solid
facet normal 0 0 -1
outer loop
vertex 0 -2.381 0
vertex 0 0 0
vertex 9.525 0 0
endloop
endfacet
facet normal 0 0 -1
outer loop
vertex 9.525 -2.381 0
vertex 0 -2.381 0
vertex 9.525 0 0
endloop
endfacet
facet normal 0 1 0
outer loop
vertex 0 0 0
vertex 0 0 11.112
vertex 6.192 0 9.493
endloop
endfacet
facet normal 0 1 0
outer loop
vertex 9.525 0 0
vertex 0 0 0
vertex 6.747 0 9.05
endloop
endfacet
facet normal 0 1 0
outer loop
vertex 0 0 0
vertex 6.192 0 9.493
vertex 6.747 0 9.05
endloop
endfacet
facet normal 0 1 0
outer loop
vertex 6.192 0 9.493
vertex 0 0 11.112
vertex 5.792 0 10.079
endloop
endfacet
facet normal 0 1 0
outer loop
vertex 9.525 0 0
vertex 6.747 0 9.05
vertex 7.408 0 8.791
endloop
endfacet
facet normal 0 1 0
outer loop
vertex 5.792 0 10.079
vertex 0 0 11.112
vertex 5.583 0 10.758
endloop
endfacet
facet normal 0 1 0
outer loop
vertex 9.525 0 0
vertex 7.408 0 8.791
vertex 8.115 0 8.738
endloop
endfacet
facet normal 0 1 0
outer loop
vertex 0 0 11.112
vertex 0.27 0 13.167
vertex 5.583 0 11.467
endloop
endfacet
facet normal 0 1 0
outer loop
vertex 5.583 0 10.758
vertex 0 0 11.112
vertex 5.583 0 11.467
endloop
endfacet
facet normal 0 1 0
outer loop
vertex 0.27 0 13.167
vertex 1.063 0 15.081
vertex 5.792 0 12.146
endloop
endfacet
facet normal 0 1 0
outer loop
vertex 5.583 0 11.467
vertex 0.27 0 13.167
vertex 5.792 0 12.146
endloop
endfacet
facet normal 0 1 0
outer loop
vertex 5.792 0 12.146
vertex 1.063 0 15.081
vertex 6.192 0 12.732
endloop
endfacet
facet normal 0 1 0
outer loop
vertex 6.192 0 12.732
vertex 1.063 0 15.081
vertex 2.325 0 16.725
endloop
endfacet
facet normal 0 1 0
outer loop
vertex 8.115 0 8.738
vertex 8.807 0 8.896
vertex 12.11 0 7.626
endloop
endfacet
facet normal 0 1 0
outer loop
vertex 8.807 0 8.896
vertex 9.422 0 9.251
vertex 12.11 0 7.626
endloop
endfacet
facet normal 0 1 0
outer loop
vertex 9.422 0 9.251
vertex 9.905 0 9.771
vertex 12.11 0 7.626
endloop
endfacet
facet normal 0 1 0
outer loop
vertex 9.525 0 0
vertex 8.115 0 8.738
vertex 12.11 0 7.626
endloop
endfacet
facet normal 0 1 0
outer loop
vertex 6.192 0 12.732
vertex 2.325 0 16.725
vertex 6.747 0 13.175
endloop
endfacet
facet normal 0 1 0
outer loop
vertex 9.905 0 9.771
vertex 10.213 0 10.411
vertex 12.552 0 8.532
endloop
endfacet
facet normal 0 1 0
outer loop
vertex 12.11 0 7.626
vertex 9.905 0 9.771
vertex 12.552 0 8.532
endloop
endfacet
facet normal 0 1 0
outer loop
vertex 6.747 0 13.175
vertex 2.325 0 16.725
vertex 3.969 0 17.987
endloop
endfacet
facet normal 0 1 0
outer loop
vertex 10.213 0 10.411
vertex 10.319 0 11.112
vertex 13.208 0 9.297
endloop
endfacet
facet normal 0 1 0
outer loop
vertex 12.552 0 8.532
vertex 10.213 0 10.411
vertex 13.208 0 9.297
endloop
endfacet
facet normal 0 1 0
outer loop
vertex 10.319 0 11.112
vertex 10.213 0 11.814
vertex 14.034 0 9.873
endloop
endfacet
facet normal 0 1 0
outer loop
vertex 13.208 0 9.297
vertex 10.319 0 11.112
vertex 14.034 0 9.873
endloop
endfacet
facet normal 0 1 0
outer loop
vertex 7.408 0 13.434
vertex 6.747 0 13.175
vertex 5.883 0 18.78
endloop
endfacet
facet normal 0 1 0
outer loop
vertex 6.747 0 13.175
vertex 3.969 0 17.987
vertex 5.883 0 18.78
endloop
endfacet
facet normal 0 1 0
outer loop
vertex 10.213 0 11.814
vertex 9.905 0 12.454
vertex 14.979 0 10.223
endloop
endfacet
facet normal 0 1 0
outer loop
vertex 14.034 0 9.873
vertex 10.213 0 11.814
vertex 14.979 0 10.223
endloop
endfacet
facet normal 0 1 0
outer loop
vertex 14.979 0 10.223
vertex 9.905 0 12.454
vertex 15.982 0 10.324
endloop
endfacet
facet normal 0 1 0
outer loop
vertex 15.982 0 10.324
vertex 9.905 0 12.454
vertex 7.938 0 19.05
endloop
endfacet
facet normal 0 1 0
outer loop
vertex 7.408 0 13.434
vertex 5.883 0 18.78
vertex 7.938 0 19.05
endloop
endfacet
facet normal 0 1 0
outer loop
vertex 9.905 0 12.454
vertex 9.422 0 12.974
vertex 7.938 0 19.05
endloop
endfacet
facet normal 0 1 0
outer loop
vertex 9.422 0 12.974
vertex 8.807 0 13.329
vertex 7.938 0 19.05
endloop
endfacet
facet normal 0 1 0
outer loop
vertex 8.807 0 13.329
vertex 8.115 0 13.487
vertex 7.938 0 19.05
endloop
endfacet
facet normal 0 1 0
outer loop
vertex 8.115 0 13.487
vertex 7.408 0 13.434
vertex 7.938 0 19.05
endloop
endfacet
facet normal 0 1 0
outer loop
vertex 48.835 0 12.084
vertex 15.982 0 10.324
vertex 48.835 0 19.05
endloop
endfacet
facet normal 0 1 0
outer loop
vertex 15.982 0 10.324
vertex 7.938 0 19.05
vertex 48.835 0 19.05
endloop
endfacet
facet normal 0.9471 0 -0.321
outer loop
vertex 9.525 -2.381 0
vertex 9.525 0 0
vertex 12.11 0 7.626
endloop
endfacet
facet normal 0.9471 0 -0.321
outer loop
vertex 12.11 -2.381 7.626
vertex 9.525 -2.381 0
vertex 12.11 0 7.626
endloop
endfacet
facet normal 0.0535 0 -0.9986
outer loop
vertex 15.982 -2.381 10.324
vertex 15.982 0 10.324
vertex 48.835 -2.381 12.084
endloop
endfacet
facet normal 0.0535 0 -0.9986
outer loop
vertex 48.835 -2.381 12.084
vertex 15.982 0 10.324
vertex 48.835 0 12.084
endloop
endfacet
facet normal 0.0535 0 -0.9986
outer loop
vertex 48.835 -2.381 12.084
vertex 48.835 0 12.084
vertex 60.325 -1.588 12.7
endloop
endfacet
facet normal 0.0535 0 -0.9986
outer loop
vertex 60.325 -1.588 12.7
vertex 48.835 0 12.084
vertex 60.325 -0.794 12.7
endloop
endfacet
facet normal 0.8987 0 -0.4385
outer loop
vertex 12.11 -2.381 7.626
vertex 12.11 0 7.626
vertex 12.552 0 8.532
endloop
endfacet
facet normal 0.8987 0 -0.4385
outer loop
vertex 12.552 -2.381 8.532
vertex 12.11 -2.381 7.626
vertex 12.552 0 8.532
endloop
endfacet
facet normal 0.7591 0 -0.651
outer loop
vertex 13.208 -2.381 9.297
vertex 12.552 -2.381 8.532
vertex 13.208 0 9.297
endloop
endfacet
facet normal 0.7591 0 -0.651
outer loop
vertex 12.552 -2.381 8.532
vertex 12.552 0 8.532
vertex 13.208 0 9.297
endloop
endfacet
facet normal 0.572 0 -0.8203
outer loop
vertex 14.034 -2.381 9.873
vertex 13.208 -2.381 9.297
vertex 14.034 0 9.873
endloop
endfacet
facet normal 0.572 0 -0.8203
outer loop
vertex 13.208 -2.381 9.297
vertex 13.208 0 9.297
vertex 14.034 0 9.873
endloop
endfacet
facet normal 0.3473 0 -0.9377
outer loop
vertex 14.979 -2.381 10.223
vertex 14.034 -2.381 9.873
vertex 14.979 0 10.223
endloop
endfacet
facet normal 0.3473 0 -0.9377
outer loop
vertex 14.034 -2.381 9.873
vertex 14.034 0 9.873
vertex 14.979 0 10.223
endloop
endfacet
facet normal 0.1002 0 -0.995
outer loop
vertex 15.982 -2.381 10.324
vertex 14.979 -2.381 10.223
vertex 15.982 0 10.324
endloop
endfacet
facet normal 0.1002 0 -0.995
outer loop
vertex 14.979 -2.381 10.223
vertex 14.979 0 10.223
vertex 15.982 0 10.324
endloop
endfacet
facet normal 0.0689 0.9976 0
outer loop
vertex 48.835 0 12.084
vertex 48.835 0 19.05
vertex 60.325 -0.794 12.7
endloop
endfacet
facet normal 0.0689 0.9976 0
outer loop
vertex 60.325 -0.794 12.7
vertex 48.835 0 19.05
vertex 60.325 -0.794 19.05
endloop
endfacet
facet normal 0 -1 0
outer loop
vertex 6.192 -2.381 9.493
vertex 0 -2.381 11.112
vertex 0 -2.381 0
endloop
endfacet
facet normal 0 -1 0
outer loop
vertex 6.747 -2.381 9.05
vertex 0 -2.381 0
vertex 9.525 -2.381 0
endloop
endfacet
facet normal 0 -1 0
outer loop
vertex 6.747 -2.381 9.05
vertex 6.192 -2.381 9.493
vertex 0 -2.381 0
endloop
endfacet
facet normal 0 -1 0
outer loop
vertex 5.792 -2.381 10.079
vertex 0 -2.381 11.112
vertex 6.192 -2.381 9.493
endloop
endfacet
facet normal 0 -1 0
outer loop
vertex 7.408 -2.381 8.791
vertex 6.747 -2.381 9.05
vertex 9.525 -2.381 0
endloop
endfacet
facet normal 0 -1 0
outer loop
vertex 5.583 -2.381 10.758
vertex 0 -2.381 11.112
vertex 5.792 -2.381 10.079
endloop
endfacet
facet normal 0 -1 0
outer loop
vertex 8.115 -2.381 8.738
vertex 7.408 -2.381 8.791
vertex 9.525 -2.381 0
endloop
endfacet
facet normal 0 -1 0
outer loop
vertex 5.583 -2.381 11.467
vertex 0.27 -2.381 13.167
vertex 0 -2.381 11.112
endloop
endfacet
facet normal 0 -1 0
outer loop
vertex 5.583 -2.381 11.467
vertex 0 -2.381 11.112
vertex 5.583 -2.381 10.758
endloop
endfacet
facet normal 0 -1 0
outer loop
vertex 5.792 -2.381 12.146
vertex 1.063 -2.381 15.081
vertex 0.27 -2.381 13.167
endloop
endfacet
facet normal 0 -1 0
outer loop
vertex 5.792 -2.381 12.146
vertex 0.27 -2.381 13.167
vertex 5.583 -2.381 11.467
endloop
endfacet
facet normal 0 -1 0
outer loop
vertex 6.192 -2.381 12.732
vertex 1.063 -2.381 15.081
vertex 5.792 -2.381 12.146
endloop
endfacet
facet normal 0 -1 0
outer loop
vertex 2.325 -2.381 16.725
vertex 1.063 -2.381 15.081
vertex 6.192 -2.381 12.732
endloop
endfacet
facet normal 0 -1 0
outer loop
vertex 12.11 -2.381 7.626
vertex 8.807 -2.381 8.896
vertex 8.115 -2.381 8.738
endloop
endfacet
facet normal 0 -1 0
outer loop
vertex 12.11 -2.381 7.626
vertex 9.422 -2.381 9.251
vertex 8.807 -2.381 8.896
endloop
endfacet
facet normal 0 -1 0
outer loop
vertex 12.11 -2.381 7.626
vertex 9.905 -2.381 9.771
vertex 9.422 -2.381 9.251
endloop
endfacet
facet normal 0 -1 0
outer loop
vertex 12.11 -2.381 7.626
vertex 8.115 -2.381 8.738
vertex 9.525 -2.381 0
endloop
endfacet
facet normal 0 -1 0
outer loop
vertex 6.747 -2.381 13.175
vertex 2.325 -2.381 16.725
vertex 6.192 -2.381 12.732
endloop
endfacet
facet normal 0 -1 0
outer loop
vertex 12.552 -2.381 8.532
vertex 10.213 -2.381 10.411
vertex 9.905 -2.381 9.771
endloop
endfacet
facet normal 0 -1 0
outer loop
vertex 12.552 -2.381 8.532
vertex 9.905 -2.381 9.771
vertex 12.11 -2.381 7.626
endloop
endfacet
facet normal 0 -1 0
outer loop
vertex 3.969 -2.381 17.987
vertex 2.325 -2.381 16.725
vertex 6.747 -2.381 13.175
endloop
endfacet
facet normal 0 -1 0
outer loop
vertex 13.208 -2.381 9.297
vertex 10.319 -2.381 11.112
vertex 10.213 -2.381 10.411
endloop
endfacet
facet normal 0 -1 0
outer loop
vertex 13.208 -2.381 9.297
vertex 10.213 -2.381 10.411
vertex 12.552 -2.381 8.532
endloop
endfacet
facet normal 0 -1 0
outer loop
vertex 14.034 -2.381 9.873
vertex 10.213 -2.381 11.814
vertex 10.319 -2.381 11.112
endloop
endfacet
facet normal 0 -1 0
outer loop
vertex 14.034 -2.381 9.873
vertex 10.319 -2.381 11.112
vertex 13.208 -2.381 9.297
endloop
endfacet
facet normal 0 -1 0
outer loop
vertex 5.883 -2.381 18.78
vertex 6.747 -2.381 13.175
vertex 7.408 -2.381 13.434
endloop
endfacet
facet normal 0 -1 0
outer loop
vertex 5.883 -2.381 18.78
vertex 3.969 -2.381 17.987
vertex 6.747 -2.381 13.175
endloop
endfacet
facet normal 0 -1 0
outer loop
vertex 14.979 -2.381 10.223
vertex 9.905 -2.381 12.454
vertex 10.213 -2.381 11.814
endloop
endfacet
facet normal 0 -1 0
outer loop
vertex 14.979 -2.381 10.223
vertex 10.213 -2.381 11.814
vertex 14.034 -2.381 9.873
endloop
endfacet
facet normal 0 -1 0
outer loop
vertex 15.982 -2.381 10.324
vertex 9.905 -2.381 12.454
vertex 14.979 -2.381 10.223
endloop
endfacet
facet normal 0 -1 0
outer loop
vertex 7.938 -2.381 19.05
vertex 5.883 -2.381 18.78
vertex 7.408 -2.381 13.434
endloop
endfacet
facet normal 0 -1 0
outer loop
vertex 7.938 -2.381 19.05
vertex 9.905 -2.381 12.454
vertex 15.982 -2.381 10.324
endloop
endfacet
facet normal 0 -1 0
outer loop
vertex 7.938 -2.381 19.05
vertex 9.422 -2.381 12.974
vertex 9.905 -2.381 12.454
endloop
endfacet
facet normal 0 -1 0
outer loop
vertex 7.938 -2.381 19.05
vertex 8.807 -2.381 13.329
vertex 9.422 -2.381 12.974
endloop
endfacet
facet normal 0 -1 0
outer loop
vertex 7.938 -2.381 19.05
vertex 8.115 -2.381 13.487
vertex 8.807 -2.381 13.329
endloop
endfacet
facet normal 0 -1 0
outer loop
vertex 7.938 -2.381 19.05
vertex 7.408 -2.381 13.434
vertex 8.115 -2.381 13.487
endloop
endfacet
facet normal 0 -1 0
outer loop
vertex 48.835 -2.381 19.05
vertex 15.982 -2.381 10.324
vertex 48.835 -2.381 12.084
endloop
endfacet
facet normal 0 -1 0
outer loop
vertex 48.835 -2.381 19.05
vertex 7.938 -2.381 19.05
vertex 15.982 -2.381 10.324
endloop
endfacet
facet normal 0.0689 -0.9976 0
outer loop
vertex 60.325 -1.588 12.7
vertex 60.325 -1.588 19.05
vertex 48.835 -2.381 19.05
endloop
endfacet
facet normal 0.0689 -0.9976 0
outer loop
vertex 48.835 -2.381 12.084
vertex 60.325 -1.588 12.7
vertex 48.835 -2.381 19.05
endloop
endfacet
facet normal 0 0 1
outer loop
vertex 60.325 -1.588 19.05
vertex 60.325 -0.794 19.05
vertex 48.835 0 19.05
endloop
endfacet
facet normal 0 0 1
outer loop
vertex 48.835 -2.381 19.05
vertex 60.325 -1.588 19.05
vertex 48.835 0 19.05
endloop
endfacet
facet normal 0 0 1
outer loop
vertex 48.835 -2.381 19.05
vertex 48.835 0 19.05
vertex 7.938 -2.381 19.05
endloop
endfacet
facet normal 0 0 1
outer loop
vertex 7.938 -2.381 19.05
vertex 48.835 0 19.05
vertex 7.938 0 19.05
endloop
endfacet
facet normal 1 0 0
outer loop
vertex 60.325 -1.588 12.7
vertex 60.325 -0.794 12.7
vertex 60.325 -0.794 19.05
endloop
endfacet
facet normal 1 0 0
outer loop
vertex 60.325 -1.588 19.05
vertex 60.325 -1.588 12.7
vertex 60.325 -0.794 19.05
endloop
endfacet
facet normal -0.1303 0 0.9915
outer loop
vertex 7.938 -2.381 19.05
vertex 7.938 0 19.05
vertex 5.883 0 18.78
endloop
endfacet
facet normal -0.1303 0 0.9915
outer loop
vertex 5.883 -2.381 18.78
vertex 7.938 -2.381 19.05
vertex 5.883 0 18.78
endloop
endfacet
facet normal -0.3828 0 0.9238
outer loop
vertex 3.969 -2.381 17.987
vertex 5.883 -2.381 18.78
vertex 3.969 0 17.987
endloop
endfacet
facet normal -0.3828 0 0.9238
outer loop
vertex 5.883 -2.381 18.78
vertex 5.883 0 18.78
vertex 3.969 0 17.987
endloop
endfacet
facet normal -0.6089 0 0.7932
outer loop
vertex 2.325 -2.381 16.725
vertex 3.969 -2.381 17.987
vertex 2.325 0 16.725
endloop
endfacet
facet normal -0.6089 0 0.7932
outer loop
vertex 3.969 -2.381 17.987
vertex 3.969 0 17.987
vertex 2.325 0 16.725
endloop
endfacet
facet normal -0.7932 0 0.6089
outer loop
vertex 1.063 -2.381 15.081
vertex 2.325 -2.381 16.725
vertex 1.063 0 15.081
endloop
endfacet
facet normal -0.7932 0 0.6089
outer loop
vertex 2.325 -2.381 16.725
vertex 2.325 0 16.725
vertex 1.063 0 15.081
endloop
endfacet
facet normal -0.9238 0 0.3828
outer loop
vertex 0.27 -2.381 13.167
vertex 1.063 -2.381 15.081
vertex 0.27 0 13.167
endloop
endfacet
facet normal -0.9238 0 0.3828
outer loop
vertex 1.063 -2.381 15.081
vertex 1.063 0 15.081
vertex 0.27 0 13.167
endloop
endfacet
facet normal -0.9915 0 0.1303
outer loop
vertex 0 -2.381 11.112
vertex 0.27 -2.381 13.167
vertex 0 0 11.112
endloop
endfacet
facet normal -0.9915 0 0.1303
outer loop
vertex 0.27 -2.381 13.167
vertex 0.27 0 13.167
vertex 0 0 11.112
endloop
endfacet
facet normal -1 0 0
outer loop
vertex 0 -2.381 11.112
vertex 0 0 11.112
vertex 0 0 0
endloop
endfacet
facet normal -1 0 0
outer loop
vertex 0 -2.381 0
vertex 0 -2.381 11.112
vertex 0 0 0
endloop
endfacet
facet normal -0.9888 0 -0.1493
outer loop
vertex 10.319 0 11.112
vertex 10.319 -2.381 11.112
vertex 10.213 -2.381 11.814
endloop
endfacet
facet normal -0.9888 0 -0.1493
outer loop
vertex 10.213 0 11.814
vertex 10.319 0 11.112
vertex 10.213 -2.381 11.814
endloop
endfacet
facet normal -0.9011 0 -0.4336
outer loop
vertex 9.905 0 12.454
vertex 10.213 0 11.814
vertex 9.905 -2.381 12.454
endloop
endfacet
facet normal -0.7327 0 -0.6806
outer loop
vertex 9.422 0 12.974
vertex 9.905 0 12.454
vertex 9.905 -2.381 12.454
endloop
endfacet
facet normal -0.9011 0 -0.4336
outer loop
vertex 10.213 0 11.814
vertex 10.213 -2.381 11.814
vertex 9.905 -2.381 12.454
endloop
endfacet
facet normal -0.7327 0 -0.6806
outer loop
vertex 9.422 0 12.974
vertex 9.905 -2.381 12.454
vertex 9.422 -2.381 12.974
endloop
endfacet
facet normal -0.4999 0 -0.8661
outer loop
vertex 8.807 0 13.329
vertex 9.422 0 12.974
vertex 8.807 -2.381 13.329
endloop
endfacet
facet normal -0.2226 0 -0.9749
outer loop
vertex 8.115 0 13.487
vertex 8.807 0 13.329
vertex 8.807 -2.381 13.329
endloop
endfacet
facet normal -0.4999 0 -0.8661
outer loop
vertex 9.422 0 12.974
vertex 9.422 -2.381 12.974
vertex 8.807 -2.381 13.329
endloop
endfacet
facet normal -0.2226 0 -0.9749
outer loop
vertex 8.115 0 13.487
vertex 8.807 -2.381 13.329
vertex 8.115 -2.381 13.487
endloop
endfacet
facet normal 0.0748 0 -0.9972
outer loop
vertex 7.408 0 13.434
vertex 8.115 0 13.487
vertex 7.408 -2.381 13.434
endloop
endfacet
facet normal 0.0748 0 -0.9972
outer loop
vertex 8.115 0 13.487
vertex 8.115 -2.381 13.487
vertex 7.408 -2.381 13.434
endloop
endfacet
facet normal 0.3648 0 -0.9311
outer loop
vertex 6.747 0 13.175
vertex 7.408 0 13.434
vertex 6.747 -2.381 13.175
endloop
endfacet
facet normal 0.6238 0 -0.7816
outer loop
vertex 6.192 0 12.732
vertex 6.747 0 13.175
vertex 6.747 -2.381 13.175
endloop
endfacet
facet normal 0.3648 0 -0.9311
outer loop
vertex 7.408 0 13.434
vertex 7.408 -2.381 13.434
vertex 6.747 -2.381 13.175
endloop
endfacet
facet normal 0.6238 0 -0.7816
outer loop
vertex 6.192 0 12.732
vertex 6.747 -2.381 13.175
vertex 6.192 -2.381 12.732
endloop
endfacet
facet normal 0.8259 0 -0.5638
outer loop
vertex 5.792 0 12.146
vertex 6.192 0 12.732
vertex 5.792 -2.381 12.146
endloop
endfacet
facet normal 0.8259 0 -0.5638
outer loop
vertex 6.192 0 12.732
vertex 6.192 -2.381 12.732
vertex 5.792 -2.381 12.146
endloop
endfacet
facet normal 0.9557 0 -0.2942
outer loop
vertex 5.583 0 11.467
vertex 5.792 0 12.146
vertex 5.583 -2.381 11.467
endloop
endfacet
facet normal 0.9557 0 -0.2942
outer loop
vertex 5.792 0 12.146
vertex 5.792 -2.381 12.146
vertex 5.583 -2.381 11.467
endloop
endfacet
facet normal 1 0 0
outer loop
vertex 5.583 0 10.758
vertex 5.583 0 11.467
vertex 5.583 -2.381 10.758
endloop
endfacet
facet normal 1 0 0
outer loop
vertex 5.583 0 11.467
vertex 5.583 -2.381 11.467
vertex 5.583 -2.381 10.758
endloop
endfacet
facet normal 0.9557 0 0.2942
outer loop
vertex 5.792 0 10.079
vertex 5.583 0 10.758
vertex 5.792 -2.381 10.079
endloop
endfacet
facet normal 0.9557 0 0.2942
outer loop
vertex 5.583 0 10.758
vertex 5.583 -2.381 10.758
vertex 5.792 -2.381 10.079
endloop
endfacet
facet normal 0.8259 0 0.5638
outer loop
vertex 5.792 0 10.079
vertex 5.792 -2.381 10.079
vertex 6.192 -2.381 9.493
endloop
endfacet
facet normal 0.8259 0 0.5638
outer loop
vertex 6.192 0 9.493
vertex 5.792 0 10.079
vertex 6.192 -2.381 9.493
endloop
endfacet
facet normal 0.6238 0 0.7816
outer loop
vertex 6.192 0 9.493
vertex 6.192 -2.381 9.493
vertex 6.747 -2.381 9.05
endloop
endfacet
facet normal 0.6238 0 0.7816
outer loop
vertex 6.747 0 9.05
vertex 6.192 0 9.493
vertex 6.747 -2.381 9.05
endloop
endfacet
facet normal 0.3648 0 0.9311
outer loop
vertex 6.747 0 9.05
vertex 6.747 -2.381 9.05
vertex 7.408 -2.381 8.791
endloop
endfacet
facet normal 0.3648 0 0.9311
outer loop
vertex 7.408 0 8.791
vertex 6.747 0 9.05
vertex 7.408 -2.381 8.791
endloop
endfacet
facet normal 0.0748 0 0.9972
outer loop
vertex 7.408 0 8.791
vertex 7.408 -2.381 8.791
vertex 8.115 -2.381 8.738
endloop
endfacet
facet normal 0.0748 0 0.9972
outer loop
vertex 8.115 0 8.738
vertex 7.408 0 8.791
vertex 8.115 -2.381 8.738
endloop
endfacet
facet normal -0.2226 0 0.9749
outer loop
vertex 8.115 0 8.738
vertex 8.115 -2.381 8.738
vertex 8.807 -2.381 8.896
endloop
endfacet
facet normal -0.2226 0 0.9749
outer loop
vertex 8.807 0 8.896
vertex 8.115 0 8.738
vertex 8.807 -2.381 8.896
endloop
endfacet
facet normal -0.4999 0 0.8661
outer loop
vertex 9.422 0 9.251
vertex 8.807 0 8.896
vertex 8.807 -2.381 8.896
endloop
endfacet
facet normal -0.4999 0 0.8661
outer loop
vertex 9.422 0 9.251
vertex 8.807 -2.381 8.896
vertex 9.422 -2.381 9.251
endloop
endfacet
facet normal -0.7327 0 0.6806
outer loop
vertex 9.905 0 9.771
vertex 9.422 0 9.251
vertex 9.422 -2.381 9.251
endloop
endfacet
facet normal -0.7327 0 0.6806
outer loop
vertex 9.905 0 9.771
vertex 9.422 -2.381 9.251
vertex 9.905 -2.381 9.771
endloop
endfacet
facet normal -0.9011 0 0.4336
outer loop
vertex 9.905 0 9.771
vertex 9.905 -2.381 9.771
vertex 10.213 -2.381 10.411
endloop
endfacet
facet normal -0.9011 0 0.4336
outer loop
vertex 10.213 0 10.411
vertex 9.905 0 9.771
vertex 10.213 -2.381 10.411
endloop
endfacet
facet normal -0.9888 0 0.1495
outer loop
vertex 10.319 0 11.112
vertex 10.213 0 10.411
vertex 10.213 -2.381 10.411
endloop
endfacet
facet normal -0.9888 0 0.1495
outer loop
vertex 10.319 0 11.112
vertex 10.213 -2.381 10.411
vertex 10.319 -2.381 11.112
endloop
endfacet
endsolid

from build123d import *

# Parameters (mm, degrees)
F1_DEPTH = 2.38125
F2_R     = 2.38125
F3_DEPTH = 25.4
F5_DEPTH = 25.4


with BuildPart() as f1:
    # F0 (on Front) → F1 (new body)
    with BuildSketch(Plane.XZ):
        with BuildLine():
            Line((60.325, 19.05), (7.9375, 19.05))
            ThreePointArc((7.9375, 19.05), (2.32484, 16.72516), (0, 11.1125))
            Line((0, 11.1125), (0, 0))
            Line((0, 0), (9.525, 0))
            Line((9.525, 0), (12.110345, 7.626242))
            ThreePointArc((12.110345, 7.626242), (13.602572, 9.611517), (15.981838, 10.323664))
            Line((15.981838, 10.323664), (60.325, 12.7))
            Line((60.325, 12.7), (60.325, 19.05))
        make_face()
    extrude(amount=F1_DEPTH)

    # F2 (on face) → F3 (cut)
    with BuildSketch(Plane.XZ.offset(2.38125)):
        with Locations((7.9375, 11.1125)):
            Circle(F2_R)
    extrude(amount=-F3_DEPTH, mode=Mode.SUBTRACT)

    # F4 (on face) → F5 (cut)
    with BuildSketch(Plane.XY.offset(19.05)):
        Polygon((60.325, 0), (48.834524, 0), (60.325, -0.79375), align=None)
        Polygon((60.325, -2.38125), (60.325, -1.5875), (48.834524, -2.38125), align=None)
    extrude(amount=-F5_DEPTH, mode=Mode.SUBTRACT)


solid = f1.part
